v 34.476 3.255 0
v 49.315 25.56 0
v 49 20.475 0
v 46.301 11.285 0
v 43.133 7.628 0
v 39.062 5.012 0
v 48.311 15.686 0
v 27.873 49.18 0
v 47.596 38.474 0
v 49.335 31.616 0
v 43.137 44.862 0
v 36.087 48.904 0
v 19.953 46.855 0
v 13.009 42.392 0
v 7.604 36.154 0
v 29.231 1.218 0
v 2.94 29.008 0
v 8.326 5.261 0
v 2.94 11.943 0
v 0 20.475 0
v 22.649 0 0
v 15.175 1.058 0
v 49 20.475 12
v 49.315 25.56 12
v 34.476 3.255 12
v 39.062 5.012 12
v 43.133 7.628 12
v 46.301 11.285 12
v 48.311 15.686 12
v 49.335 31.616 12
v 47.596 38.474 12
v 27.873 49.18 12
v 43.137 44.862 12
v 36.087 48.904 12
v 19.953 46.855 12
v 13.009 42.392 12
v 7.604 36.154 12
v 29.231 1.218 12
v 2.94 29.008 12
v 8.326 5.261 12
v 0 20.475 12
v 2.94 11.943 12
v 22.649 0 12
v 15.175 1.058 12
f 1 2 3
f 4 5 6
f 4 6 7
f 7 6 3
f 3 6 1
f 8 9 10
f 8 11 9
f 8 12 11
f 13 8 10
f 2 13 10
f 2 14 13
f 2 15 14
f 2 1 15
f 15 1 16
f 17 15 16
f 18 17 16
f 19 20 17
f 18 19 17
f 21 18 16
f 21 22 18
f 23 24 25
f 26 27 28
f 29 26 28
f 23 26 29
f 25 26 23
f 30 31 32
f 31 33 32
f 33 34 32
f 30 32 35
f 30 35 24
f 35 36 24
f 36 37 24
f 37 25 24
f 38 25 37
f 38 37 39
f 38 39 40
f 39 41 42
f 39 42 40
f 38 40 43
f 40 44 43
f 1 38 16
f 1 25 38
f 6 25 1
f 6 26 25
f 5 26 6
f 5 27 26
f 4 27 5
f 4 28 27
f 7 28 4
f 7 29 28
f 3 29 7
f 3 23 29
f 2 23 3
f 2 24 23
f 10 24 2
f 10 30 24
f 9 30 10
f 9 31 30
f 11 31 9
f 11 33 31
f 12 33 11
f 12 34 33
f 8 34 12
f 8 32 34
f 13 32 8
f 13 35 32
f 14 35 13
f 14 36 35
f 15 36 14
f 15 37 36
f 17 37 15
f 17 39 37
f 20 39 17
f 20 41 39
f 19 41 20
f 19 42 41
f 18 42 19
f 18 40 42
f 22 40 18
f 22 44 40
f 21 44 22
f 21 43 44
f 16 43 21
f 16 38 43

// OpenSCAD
$fn = 32;

// ----------------------------------------------------------------------
// Cam disc: base radius 17.0 mm, lift 12.0 mm, 22 profile points
// ----------------------------------------------------------------------

// --- parameters (mm) ---
profile_height = 12;      // extrusion height
profile_points = 22;      // points of the closed outline

profile = [[49, 20.475], [49.315, 25.56], [49.335, 31.616], [47.596, 38.474], [43.137, 44.862], [36.087, 48.904], [27.873, 49.18], [19.953, 46.855], [13.009, 42.392], [7.604, 36.154], [2.94, 29.008], [0, 20.475], [2.94, 11.943], [8.326, 5.261], [15.175, 1.058], [22.649, 0], [29.231, 1.218], [34.476, 3.255], [39.062, 5.012], [43.133, 7.628], [46.301, 11.285], [48.311, 15.686]];  // single closed polygon, 22 points, counter clockwise

// --- the one profile operation ---
linear_extrude(height = profile_height) polygon(points = profile);
